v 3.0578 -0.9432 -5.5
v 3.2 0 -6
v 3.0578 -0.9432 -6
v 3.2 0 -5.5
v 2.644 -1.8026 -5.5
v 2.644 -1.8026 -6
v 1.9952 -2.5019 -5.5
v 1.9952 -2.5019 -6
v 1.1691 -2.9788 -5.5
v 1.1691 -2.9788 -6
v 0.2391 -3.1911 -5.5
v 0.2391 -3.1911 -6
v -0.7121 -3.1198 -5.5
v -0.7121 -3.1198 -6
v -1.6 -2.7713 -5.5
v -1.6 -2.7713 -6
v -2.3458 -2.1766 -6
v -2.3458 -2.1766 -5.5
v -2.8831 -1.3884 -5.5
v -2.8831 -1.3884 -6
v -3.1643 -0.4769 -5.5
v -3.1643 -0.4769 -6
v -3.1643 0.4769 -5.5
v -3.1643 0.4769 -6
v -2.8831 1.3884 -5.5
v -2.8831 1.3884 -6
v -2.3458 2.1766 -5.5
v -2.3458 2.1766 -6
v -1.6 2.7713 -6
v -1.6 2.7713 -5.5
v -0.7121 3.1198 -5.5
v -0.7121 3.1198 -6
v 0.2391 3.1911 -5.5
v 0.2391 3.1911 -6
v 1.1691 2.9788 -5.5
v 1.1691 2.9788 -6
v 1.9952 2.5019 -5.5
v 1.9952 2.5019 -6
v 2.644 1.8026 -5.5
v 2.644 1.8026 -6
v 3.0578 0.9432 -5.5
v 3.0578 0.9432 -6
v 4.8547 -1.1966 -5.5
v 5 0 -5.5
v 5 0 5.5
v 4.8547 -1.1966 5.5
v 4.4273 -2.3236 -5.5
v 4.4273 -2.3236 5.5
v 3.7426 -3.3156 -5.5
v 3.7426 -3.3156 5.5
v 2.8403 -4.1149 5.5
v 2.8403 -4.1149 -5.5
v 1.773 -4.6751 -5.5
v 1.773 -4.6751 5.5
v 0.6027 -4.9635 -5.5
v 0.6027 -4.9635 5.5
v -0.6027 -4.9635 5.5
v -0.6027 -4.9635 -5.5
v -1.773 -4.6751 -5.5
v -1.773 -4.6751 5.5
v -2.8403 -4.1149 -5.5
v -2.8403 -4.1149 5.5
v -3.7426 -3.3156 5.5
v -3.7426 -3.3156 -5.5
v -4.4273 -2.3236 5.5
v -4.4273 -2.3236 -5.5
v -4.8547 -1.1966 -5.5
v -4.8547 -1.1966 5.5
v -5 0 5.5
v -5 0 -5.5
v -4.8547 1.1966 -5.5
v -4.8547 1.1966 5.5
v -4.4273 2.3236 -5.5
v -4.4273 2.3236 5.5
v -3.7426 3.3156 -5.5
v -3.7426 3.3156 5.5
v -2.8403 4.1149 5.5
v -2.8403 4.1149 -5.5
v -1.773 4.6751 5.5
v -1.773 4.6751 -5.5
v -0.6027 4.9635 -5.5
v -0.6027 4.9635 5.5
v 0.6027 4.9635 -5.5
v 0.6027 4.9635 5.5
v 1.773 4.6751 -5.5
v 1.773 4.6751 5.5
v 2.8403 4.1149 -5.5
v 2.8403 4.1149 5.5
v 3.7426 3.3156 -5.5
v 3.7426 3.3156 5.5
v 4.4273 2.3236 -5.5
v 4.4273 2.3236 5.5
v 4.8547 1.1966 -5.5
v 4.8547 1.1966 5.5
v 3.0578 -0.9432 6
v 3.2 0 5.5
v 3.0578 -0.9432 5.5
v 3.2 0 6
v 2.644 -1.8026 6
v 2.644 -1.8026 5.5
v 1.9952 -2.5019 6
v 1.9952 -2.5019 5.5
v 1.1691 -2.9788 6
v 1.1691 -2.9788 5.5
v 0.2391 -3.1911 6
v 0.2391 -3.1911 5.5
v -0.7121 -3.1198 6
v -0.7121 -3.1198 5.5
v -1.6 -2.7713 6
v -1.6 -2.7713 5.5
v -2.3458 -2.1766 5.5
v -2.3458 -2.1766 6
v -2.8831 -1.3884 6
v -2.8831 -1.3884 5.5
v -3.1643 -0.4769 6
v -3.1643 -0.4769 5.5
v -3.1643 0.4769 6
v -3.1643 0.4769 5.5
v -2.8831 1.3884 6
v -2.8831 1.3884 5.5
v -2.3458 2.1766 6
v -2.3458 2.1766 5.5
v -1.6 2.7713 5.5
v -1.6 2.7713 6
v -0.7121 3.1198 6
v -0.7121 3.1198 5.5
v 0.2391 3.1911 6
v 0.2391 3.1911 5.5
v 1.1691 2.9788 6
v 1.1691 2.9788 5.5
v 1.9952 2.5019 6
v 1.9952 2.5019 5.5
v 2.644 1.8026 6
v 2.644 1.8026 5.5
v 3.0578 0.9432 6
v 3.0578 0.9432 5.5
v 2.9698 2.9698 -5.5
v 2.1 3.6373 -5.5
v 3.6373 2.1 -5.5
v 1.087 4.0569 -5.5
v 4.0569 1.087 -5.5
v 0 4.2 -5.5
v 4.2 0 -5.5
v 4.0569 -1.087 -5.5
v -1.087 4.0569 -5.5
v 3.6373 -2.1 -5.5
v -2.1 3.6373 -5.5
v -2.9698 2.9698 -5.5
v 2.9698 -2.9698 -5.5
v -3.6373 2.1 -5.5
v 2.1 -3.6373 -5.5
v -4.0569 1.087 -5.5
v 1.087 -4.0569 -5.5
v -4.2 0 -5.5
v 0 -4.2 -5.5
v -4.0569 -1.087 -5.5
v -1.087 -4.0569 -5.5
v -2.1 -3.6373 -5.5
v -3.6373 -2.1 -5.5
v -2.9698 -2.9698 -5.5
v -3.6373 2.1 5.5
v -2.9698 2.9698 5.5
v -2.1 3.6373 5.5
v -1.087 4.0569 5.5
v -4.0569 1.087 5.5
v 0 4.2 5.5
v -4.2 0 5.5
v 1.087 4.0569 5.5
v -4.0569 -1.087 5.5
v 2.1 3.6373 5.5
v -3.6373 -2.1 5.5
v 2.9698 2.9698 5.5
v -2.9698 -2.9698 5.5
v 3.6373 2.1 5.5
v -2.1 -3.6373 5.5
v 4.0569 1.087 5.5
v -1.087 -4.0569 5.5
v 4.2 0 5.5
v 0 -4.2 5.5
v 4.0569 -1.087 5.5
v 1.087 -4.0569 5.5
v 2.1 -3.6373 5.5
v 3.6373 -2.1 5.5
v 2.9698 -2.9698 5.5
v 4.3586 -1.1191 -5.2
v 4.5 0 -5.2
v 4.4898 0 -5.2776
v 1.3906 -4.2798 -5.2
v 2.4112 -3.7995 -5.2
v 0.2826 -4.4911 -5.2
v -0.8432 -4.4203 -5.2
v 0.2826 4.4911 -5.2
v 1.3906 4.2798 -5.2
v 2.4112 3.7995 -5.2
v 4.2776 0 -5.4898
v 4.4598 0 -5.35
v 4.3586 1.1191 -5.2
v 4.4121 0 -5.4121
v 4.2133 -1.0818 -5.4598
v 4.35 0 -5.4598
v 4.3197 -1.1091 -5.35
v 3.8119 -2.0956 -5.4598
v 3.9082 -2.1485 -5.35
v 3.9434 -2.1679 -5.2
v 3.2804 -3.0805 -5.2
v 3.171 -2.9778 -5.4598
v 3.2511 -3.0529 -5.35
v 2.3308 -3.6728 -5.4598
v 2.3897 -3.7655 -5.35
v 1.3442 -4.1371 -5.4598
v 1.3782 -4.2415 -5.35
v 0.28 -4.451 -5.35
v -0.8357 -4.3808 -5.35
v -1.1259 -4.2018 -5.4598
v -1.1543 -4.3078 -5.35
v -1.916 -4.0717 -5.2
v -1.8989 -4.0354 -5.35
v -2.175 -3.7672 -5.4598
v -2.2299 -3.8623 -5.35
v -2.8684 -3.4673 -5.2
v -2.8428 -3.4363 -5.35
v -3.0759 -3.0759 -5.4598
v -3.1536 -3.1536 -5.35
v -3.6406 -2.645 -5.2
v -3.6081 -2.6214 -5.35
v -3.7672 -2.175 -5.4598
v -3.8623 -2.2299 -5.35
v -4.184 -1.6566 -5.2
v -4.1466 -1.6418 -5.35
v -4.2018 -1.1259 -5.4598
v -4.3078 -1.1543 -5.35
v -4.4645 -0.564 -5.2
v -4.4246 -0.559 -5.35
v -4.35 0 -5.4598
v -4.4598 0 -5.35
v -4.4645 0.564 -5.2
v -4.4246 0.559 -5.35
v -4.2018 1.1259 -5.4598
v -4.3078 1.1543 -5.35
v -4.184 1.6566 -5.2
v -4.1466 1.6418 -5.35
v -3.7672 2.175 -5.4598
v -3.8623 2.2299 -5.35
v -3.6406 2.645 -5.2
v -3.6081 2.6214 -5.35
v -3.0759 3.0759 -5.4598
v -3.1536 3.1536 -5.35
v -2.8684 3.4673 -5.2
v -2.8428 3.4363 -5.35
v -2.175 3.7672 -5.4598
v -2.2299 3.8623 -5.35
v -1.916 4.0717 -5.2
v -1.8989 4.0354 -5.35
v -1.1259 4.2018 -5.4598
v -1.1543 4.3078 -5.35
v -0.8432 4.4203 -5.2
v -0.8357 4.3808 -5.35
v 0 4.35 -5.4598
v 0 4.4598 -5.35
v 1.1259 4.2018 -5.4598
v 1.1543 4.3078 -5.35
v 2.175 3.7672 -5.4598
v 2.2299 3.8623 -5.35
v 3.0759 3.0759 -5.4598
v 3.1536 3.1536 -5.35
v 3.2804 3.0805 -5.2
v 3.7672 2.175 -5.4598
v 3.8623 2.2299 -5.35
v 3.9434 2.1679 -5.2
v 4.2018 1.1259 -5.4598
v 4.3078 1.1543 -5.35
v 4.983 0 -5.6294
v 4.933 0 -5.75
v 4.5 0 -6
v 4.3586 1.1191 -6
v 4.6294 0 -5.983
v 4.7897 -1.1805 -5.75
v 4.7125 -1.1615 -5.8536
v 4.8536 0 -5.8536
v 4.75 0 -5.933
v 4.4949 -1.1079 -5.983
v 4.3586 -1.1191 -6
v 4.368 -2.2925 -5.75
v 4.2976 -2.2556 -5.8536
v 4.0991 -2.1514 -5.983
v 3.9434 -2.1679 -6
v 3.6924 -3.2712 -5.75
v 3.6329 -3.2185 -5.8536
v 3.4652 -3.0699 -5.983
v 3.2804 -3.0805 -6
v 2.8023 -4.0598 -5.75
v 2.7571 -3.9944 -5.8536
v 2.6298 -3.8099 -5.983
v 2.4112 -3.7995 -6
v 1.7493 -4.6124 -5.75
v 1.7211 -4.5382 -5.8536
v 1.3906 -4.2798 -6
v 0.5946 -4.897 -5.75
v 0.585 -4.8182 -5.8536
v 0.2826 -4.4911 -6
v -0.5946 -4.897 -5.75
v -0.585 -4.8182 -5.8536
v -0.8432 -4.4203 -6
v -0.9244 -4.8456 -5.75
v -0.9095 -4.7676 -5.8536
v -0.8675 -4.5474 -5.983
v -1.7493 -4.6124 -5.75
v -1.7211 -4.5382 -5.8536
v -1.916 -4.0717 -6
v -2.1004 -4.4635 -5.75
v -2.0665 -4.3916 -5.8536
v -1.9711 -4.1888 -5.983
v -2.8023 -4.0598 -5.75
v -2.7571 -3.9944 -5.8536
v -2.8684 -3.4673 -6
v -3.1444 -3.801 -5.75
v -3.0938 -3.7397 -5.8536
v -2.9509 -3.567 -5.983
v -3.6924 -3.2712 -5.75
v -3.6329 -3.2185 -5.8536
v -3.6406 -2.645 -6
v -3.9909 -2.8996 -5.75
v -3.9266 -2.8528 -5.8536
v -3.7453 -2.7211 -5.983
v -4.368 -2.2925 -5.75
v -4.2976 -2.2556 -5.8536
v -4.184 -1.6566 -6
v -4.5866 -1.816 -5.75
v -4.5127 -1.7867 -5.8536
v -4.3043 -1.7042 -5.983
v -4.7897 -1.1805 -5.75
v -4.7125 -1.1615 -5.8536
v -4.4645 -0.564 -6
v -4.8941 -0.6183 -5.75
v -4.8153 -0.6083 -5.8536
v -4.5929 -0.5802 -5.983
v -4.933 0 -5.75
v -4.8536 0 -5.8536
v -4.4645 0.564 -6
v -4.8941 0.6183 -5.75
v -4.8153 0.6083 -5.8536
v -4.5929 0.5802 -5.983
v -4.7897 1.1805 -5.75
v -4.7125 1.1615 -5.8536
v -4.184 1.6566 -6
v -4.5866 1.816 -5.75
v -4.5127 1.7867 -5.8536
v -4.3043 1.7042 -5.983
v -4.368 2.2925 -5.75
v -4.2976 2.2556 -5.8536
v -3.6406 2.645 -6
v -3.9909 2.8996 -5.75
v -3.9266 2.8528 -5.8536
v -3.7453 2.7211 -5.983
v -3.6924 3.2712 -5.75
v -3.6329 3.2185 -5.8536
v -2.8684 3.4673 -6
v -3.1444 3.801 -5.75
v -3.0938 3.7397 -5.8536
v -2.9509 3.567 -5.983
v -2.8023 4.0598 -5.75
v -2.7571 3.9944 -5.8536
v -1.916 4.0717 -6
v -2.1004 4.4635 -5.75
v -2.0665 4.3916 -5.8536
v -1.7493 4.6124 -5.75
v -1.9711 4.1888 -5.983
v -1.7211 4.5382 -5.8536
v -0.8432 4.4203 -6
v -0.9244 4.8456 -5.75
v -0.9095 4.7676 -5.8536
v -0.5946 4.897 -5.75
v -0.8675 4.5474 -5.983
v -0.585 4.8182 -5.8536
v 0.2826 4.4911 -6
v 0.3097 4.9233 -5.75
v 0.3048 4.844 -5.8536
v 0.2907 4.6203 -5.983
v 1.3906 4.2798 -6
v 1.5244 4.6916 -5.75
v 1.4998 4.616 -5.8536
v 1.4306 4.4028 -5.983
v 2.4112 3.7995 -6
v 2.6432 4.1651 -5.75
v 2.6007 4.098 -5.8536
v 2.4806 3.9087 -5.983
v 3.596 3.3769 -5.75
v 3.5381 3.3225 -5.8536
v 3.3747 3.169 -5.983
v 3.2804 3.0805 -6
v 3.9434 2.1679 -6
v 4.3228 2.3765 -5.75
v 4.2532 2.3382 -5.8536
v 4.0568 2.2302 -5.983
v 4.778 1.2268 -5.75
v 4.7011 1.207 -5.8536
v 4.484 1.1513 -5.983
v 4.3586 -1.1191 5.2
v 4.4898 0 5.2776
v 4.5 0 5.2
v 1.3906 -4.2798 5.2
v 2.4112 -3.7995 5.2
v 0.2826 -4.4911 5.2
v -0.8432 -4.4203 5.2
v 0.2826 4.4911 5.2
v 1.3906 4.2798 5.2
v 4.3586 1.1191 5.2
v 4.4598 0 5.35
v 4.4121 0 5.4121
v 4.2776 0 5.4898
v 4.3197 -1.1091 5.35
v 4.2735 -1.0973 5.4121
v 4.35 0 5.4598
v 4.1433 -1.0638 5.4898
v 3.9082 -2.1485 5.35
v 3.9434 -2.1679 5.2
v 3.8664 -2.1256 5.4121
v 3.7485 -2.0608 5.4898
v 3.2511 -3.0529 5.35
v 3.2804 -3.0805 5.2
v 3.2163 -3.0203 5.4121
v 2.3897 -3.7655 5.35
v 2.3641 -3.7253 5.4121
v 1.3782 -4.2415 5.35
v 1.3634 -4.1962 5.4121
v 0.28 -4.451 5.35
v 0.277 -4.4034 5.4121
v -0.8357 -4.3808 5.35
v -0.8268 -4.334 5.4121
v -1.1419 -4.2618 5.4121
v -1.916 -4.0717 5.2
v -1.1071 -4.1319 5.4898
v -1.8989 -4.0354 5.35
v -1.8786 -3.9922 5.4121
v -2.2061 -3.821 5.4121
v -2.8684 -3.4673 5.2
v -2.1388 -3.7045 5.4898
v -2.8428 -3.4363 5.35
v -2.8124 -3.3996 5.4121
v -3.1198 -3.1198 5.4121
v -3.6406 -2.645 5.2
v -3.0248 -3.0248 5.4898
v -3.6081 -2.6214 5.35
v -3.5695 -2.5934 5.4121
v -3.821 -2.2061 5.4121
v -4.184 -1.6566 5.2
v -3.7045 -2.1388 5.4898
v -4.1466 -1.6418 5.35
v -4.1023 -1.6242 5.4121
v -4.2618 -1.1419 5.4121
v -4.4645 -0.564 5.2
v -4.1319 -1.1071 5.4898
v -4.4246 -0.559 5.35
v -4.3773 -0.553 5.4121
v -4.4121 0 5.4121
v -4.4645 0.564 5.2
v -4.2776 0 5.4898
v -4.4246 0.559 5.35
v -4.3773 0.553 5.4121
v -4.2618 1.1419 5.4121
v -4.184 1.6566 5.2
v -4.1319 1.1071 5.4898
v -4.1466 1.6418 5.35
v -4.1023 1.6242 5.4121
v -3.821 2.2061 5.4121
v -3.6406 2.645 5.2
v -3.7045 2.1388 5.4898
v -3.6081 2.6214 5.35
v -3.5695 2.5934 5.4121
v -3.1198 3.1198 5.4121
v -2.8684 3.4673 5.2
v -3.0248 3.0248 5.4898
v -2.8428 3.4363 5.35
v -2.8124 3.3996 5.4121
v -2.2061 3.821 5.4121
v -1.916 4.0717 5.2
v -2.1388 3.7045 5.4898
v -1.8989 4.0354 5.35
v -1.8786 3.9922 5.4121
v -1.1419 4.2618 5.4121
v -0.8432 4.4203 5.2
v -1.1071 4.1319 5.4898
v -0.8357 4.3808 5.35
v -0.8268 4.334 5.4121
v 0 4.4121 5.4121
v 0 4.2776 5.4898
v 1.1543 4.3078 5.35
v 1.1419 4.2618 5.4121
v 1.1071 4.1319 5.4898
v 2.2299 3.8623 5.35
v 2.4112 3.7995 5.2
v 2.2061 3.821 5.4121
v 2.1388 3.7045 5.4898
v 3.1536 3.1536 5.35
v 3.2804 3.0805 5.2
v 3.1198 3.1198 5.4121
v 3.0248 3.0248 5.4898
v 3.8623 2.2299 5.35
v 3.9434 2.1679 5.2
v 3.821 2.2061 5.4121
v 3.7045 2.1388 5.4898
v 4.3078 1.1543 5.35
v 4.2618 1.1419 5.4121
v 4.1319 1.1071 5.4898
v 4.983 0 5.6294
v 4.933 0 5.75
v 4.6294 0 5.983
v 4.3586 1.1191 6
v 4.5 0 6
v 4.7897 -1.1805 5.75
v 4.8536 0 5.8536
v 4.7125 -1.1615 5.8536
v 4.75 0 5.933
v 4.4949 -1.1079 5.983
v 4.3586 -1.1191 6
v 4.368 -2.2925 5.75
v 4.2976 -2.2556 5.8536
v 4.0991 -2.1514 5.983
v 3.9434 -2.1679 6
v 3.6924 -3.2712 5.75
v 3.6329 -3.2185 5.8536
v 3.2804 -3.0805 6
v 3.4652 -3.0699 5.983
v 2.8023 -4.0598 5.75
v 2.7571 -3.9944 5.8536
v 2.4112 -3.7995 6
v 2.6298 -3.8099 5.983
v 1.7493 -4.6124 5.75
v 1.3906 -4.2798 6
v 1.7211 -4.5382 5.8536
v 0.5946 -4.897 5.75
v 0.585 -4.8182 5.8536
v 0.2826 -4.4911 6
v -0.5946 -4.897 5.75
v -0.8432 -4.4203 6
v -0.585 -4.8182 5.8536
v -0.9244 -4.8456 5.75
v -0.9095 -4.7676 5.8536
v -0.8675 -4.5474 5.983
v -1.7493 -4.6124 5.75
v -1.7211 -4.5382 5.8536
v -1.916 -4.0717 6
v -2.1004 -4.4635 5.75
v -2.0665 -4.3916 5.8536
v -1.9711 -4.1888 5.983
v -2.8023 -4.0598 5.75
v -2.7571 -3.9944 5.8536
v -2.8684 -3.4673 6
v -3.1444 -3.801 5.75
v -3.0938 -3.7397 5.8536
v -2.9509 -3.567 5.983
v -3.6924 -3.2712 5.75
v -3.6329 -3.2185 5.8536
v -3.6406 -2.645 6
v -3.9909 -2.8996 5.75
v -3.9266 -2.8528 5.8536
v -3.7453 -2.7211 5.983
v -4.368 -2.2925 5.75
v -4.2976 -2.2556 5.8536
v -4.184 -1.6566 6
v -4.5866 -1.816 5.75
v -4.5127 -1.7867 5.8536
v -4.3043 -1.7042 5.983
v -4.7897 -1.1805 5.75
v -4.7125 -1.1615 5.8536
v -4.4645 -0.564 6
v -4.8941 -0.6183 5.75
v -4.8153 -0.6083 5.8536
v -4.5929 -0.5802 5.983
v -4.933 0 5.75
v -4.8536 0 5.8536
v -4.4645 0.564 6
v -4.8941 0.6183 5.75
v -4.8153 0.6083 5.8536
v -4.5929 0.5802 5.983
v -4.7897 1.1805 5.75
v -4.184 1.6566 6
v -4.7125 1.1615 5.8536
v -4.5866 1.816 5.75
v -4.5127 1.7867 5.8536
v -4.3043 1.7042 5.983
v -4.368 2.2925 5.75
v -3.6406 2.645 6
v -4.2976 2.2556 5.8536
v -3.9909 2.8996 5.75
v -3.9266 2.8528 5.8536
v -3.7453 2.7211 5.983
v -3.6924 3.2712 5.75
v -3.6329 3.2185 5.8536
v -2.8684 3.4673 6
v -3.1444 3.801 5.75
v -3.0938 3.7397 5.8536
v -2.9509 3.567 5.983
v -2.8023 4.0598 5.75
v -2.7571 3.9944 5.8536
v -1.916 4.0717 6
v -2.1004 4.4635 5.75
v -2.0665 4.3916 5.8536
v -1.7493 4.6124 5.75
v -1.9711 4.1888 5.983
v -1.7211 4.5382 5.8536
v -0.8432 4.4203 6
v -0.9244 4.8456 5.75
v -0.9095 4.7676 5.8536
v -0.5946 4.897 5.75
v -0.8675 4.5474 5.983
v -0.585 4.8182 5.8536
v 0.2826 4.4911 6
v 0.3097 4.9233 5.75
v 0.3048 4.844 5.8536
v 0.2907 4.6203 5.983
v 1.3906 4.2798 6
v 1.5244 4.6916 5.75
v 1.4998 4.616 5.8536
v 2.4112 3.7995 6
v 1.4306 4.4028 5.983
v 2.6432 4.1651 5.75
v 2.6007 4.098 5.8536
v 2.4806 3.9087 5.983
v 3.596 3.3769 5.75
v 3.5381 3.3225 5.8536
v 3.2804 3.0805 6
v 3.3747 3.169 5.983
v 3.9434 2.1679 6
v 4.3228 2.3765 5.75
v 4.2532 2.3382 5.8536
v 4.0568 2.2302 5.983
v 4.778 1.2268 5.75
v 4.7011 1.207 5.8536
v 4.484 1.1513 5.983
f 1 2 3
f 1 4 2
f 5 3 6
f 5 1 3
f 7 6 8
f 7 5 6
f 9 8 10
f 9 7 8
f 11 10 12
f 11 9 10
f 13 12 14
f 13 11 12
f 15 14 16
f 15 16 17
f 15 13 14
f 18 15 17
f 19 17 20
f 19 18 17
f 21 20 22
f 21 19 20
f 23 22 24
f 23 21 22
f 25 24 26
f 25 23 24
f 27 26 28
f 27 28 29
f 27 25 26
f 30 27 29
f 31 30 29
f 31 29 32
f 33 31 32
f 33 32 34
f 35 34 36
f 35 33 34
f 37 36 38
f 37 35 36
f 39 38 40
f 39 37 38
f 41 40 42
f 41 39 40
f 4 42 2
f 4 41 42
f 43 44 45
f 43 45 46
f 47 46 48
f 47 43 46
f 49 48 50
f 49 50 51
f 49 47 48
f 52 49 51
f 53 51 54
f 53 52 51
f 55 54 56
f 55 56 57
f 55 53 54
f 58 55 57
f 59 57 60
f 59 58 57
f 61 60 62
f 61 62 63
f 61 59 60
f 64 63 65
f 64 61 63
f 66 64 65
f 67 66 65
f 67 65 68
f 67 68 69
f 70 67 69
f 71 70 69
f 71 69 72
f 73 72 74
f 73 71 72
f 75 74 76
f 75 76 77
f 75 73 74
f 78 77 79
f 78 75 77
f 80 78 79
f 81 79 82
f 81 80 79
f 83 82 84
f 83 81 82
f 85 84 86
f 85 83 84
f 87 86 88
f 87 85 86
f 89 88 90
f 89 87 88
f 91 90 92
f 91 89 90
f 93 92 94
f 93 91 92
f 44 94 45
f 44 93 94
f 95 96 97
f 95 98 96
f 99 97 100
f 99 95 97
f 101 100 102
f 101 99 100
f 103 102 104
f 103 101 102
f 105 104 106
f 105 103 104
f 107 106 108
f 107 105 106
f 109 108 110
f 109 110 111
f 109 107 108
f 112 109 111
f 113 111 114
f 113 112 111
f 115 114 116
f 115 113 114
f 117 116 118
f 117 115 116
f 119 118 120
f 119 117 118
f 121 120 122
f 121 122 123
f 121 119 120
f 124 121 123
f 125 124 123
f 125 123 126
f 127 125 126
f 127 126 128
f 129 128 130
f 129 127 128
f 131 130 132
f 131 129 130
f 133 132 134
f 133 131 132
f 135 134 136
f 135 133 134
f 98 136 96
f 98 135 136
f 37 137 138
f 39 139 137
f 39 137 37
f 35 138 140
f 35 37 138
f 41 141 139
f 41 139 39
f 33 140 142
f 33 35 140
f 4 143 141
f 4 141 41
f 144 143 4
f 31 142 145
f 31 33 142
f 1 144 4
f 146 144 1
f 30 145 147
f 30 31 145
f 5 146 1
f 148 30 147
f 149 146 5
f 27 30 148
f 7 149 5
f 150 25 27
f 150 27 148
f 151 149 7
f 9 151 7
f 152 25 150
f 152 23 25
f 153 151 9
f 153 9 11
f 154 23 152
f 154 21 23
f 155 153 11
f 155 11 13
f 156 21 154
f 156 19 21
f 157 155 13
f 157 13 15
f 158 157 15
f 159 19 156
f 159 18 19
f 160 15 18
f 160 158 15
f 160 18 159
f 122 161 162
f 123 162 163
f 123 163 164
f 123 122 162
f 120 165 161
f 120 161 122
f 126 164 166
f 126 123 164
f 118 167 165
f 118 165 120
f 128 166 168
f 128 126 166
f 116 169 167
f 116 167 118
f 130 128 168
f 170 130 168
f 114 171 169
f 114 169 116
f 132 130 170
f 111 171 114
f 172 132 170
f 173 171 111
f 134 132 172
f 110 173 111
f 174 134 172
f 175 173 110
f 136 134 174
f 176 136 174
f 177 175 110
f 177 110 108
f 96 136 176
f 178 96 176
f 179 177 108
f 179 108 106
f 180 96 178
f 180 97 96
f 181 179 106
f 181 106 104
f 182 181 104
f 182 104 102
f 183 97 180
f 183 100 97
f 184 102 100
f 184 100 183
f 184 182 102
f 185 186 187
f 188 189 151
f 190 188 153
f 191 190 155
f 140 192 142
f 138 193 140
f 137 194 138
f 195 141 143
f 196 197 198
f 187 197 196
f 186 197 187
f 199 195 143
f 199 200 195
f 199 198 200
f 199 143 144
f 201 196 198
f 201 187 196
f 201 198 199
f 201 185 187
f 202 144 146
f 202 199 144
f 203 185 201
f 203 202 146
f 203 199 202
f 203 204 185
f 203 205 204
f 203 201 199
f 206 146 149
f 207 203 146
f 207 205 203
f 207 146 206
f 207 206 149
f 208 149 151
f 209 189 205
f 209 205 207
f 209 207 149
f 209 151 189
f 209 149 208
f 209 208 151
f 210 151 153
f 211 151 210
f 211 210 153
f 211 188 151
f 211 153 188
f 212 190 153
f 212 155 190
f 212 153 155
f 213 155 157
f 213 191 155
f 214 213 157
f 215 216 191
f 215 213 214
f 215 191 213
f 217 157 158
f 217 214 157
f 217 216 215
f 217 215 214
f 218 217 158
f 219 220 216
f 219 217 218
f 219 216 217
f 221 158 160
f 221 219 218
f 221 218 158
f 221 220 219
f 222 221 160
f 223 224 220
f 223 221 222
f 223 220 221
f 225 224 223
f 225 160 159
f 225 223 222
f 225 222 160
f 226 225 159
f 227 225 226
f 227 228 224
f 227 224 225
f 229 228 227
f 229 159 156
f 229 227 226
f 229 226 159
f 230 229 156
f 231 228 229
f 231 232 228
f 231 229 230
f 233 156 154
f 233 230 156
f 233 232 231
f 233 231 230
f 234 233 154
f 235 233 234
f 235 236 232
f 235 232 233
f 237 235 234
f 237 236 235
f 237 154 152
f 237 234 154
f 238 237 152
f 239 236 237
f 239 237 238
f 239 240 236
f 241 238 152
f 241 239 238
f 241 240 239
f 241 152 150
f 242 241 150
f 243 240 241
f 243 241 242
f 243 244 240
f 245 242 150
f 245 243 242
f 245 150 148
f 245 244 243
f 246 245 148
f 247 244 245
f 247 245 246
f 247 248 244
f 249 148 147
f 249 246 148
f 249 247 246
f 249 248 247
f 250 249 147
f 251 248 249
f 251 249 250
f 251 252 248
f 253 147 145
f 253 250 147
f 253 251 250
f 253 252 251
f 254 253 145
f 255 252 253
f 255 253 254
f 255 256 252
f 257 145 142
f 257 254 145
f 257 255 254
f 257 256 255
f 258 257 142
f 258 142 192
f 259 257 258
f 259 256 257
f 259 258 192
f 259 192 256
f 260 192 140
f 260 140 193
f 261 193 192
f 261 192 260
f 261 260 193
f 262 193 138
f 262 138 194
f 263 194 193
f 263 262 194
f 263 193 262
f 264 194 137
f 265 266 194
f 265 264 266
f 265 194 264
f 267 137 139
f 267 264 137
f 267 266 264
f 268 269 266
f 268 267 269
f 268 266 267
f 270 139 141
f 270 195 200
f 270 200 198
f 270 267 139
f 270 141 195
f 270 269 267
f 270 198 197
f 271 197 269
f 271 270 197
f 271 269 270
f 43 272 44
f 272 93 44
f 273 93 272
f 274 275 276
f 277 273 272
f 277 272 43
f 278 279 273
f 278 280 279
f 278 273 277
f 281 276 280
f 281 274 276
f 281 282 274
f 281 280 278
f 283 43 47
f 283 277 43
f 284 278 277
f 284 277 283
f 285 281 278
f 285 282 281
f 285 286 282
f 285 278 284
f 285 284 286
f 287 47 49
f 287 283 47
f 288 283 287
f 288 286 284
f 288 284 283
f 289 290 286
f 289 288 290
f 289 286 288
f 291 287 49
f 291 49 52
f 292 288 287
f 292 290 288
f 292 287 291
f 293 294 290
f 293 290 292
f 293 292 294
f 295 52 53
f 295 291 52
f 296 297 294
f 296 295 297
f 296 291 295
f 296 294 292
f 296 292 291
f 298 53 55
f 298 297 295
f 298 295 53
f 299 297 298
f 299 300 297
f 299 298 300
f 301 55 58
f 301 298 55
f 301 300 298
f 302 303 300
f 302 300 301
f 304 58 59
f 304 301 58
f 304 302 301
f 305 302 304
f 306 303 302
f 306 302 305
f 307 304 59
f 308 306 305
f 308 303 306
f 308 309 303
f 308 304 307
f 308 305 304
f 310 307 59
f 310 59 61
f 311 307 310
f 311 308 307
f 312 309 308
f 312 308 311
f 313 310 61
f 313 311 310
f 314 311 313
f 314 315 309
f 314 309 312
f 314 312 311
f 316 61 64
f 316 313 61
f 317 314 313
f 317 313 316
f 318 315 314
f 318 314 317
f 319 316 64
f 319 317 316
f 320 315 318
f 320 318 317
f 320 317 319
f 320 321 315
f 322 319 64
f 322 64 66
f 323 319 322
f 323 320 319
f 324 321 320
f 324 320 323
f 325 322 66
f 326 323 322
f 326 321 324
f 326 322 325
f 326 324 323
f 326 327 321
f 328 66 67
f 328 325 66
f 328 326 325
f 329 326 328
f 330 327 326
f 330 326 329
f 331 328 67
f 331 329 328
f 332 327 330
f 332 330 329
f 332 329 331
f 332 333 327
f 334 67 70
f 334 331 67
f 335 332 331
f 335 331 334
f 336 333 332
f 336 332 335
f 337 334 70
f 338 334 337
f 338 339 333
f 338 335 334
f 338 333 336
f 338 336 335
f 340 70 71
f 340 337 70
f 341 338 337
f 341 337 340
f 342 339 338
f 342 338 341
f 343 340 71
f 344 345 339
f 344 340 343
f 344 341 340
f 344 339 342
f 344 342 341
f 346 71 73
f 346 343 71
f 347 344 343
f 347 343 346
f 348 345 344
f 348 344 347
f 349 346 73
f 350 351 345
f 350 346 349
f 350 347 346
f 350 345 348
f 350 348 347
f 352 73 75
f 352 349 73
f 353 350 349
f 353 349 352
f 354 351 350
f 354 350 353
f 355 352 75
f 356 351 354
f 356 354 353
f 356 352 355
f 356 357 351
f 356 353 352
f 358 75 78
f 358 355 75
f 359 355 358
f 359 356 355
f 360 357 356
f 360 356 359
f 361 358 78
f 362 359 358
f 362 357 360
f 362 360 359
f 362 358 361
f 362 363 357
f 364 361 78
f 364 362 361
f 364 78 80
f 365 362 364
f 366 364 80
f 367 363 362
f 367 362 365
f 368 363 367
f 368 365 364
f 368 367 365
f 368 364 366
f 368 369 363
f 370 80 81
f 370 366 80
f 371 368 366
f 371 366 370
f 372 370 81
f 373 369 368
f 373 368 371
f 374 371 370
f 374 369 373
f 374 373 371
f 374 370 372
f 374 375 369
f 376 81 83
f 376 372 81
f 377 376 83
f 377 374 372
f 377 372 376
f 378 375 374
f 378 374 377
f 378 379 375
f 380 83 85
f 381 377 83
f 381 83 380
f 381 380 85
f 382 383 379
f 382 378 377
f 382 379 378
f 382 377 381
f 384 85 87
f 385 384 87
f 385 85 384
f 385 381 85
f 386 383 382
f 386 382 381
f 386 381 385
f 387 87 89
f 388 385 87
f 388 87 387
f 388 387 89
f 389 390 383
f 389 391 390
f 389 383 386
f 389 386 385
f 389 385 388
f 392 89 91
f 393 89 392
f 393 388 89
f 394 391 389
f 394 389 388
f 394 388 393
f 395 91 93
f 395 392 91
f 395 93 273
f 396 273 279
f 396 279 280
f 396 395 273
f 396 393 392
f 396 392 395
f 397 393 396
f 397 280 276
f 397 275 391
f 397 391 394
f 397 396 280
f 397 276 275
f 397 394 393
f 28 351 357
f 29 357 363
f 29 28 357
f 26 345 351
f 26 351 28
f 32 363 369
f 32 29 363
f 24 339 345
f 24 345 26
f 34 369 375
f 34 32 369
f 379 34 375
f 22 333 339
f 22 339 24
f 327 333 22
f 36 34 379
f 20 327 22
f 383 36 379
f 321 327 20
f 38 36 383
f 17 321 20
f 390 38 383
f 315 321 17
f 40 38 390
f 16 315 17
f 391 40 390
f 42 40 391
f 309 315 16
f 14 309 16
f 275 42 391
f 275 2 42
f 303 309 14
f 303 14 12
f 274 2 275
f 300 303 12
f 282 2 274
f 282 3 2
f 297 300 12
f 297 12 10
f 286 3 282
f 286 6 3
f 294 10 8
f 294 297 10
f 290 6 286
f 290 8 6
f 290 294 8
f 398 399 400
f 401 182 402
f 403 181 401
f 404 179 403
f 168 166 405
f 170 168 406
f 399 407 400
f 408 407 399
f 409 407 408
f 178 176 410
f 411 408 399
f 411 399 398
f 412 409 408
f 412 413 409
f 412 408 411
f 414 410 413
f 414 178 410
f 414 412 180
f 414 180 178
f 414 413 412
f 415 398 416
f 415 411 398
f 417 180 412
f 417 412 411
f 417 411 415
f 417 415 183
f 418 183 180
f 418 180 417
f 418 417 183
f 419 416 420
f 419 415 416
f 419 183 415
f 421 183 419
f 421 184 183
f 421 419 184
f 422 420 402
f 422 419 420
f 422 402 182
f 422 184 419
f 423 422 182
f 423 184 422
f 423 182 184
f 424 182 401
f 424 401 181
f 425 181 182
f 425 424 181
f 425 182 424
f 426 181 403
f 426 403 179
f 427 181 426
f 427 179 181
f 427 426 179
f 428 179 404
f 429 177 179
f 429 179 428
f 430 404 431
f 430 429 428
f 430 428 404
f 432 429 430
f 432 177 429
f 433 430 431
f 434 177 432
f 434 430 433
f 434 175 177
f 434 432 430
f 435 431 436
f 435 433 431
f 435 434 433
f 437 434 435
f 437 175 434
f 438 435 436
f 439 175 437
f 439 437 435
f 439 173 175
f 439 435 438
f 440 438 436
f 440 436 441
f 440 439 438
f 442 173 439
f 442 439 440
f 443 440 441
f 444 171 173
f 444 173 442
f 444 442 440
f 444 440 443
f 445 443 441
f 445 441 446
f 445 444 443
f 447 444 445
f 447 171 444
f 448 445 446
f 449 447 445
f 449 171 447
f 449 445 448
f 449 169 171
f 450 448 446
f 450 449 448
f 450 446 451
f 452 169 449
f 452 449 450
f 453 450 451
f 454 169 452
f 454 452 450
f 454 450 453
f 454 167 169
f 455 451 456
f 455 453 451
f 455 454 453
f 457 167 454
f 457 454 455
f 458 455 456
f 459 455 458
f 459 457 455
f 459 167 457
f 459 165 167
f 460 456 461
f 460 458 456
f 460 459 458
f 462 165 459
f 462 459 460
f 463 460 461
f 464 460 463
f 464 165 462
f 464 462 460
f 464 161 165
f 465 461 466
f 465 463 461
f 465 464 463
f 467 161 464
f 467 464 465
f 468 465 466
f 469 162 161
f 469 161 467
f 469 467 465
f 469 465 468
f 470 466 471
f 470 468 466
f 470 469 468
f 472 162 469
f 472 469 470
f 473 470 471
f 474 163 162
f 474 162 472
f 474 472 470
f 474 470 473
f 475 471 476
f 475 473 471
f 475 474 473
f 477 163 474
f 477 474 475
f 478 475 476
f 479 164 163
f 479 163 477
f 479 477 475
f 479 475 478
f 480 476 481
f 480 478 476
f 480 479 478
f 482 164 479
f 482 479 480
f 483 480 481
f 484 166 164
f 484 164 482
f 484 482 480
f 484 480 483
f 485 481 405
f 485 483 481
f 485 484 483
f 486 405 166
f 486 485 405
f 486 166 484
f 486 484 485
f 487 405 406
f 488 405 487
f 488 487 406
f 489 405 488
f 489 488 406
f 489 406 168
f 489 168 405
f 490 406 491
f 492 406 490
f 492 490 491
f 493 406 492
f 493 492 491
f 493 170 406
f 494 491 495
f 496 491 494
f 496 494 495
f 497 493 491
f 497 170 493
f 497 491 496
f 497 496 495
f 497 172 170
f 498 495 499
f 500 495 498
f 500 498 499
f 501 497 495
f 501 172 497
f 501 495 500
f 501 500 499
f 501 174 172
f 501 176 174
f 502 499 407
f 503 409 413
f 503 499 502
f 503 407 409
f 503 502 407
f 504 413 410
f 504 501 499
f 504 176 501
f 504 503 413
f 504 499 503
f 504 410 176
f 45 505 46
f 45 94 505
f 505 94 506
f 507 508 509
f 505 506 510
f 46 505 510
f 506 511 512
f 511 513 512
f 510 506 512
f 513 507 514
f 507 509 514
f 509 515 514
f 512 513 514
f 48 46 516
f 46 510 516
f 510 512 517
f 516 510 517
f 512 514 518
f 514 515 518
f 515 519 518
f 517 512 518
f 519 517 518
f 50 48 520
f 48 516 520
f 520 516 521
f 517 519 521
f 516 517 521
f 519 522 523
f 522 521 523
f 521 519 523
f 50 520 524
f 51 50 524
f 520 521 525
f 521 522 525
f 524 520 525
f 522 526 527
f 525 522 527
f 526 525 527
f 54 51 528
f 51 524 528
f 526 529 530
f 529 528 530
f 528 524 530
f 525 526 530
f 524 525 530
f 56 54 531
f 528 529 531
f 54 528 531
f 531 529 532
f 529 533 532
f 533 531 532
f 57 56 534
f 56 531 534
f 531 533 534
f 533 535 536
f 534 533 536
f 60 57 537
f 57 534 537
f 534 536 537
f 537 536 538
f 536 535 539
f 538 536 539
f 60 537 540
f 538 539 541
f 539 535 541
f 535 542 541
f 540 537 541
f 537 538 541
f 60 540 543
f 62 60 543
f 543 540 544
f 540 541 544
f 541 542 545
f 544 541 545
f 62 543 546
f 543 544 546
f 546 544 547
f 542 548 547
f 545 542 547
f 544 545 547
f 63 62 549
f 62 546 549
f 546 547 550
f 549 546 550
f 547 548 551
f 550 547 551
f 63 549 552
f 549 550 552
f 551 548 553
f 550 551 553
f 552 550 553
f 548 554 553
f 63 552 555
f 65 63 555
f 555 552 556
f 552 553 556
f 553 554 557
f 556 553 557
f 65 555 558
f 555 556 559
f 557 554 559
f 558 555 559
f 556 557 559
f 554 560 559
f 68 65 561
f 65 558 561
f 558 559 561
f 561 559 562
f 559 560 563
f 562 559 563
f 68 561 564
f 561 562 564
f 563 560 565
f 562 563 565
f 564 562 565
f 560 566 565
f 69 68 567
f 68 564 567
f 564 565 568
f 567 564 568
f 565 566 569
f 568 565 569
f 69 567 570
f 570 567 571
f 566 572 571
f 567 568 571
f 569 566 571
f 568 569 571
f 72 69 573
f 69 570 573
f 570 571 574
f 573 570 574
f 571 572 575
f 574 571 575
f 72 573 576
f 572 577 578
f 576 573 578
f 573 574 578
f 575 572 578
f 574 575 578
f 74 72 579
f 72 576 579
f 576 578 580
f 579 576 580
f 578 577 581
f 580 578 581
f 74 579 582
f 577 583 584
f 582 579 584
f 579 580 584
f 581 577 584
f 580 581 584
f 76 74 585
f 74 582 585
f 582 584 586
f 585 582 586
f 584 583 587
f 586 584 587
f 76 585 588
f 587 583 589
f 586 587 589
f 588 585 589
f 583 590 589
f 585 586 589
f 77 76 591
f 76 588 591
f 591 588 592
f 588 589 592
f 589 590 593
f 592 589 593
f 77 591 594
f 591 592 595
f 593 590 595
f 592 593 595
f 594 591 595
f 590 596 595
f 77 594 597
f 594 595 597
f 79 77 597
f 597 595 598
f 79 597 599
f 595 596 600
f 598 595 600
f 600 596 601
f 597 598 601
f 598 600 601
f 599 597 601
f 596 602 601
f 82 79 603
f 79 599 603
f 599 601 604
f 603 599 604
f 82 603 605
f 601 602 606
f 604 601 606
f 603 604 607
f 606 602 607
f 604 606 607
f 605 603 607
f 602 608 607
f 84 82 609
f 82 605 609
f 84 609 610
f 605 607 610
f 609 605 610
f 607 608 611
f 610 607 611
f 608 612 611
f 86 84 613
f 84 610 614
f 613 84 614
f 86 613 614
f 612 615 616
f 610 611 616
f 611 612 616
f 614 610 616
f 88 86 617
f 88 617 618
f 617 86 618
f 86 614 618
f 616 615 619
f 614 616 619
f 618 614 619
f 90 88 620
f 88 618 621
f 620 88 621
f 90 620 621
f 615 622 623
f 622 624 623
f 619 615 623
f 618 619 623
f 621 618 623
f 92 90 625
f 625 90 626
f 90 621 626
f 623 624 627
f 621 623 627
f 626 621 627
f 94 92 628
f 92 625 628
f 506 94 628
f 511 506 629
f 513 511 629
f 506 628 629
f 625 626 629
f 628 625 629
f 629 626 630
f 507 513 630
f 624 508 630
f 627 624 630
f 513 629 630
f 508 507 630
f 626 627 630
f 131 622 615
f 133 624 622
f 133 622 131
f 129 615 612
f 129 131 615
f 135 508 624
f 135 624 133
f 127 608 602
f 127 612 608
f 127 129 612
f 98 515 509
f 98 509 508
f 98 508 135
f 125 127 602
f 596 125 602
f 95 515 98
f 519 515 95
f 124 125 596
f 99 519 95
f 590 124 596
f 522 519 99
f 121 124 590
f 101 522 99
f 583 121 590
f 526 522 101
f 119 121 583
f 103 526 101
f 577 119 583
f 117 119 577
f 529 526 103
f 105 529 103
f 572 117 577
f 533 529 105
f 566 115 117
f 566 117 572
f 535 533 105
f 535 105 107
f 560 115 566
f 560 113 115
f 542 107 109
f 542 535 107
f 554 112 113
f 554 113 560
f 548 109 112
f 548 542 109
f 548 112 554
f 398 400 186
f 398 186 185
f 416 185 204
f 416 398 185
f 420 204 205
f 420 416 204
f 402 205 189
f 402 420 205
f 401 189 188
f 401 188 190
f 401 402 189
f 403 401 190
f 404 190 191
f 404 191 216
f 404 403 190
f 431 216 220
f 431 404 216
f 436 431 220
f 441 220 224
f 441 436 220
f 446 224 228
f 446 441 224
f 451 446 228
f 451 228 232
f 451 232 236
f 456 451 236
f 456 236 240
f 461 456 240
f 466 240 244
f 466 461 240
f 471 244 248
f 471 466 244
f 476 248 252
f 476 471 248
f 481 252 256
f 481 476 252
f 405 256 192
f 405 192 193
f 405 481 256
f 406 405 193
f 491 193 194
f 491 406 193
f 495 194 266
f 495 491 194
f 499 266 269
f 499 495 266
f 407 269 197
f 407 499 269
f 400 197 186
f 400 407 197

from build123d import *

# Parameters (mm, degrees)
FILLET_1_R = 0.3
FILLET_2_R = 0.5
FILLET_3_R = 0.5


with BuildPart() as part:
    # 草图1 → 旋转1 (revolve)
    with BuildSketch(Plane(origin=(0, 0, 0), x_dir=(1, 0, 0), z_dir=(0, 1, 0))):
        Polygon((3.2, -6), (5, -6), (5, 6), (3.2, 6), (3.2, 5.5), (4.5, 5.5), (4.5, -5.5), (3.2, -5.5), align=None)
    revolve(axis=Axis((0, 0, 32.403310218), (0, 0, -1)))

    # 圆角1
    fillet_1_edges = [part.edges().sort_by_distance(p)[0] for p in [
        (-4.5, 0, 5.5),
        (-4.5, 0, -5.5),
    ]]
    fillet(fillet_1_edges, radius=FILLET_1_R)

    # 圆角2
    fillet_2_edges = [part.edges().sort_by_distance(p)[0] for p in [
        (-5, 0, 6),
    ]]
    fillet(fillet_2_edges, radius=FILLET_2_R)

    # 圆角3
    fillet_3_edges = [part.edges().sort_by_distance(p)[0] for p in [
        (-5, 0, -6),
    ]]
    fillet(fillet_3_edges, radius=FILLET_3_R)


solid = part.part
